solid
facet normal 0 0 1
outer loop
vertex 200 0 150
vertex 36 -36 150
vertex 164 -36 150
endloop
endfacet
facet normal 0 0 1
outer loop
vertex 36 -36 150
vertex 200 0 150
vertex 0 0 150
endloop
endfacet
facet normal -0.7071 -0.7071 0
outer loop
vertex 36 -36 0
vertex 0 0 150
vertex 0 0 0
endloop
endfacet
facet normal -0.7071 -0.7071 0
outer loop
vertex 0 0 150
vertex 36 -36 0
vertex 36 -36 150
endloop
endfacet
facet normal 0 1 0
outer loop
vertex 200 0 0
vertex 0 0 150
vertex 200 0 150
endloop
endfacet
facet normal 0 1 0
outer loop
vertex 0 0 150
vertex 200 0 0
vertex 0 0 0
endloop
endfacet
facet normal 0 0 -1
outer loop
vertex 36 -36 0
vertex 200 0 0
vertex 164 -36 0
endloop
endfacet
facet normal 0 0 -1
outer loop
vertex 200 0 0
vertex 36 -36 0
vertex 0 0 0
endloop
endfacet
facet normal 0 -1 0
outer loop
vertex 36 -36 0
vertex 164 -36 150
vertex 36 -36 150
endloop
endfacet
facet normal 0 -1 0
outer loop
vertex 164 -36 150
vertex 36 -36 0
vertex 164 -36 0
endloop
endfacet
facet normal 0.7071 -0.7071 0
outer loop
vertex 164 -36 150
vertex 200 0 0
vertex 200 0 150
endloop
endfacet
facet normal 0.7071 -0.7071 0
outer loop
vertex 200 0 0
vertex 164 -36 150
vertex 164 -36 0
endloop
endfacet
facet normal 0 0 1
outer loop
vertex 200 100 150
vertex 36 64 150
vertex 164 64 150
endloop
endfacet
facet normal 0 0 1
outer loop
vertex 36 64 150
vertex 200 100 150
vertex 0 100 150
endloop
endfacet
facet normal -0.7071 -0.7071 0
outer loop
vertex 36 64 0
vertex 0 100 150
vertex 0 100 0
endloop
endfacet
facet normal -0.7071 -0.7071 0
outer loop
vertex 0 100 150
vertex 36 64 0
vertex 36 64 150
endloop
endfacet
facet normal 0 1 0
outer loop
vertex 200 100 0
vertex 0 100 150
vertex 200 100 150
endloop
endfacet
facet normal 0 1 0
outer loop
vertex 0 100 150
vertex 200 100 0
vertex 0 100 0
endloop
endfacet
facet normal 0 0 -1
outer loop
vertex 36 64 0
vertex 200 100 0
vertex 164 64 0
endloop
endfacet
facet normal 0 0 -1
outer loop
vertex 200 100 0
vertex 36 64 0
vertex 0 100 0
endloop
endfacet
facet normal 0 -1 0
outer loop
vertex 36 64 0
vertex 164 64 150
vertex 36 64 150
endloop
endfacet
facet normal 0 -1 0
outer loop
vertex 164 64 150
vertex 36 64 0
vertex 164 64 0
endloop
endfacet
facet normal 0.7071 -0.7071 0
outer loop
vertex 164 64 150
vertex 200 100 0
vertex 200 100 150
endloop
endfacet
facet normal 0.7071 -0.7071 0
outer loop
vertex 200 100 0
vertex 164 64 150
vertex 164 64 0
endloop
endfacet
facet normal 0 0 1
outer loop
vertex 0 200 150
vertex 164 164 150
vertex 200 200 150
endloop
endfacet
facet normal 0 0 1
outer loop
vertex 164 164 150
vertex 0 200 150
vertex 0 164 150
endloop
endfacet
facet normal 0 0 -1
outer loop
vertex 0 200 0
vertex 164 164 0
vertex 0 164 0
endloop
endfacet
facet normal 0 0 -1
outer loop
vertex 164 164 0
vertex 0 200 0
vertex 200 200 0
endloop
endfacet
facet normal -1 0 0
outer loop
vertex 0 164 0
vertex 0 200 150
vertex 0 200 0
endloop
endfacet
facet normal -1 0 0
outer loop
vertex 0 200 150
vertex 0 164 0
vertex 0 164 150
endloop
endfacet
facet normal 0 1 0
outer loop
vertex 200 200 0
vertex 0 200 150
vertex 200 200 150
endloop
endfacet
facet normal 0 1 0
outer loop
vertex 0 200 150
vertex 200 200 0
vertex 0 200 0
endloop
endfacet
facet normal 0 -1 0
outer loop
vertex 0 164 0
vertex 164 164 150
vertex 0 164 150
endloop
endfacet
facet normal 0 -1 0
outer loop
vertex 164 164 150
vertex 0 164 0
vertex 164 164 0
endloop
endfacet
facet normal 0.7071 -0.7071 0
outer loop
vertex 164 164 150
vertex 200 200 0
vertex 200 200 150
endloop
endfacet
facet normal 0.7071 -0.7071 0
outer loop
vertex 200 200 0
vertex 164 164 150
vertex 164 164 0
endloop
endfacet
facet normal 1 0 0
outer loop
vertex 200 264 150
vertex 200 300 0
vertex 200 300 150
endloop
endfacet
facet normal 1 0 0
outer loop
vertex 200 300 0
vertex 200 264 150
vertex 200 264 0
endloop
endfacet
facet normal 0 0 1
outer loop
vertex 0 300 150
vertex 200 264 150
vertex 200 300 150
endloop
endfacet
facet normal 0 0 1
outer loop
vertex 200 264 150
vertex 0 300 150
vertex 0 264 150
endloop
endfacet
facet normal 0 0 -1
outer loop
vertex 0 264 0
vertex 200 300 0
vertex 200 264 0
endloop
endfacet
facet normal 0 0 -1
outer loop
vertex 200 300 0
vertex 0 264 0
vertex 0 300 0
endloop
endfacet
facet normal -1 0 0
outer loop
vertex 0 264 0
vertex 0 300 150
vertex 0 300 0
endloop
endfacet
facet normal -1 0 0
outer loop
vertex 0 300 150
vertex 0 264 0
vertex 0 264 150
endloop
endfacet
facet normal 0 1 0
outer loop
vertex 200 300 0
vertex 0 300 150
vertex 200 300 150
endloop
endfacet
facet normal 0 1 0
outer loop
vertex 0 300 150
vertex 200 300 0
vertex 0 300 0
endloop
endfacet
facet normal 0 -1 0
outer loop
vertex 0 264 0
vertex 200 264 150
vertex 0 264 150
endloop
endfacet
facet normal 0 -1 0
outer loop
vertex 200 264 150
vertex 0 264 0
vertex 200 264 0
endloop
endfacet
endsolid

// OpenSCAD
// Massstab 1 entspricht einem cm

module wall(length, height, depth, phased) {
	aPhased = 
		(phased == undef) ? [true, true] : phased;
	aLength = 
		(aPhased[0] && aPhased[1]) ? 
			length - 2 * depth : 
			(aPhased[0] || aPhased[1]) ? 
				length - depth : length;

	union() {
		if(aPhased[0]) {
			rotate([0, 0, 270])
				antiprism(height, depth);
			translate ([depth, -depth, 0])	
				cube(size = [aLength, depth, 
					height]);	
		} else {
			translate ([0, -depth, 0])	
				cube(size = [aLength, depth, 
						height]);	
		}
		if(aPhased[1]) {
			translate ([length - depth, -depth, 0])
				antiprism(height, depth);
		}
	}
}

module antiprism(heihgt, depth) {
	polyhedron ( points = [
			[0, 0, heihgt], 
			[0, depth, heihgt], 
			[depth, depth, heihgt], 
			[0, 0, 0], 
			[0, depth, 0], 
			[depth, depth, 0], ], 
		triangles = [
			[0, 1, 2], 
			[0, 5, 3],
			[4, 1, 0],
			[0, 3, 4],
			[5, 3, 0],
			[0, 2, 5],
			[4, 2, 1],
			[2, 4, 5],
			[5, 4, 3], ]);
}

wall (200, 150, 36);

translate([0, 100, 0])
	wall (200, 150, 36, [true, true]);

translate([0, 200, 0])
	wall (200, 150, 36, [false, true]);

translate([0, 300, 0])
	wall (200, 150, 36, [false, false]);
